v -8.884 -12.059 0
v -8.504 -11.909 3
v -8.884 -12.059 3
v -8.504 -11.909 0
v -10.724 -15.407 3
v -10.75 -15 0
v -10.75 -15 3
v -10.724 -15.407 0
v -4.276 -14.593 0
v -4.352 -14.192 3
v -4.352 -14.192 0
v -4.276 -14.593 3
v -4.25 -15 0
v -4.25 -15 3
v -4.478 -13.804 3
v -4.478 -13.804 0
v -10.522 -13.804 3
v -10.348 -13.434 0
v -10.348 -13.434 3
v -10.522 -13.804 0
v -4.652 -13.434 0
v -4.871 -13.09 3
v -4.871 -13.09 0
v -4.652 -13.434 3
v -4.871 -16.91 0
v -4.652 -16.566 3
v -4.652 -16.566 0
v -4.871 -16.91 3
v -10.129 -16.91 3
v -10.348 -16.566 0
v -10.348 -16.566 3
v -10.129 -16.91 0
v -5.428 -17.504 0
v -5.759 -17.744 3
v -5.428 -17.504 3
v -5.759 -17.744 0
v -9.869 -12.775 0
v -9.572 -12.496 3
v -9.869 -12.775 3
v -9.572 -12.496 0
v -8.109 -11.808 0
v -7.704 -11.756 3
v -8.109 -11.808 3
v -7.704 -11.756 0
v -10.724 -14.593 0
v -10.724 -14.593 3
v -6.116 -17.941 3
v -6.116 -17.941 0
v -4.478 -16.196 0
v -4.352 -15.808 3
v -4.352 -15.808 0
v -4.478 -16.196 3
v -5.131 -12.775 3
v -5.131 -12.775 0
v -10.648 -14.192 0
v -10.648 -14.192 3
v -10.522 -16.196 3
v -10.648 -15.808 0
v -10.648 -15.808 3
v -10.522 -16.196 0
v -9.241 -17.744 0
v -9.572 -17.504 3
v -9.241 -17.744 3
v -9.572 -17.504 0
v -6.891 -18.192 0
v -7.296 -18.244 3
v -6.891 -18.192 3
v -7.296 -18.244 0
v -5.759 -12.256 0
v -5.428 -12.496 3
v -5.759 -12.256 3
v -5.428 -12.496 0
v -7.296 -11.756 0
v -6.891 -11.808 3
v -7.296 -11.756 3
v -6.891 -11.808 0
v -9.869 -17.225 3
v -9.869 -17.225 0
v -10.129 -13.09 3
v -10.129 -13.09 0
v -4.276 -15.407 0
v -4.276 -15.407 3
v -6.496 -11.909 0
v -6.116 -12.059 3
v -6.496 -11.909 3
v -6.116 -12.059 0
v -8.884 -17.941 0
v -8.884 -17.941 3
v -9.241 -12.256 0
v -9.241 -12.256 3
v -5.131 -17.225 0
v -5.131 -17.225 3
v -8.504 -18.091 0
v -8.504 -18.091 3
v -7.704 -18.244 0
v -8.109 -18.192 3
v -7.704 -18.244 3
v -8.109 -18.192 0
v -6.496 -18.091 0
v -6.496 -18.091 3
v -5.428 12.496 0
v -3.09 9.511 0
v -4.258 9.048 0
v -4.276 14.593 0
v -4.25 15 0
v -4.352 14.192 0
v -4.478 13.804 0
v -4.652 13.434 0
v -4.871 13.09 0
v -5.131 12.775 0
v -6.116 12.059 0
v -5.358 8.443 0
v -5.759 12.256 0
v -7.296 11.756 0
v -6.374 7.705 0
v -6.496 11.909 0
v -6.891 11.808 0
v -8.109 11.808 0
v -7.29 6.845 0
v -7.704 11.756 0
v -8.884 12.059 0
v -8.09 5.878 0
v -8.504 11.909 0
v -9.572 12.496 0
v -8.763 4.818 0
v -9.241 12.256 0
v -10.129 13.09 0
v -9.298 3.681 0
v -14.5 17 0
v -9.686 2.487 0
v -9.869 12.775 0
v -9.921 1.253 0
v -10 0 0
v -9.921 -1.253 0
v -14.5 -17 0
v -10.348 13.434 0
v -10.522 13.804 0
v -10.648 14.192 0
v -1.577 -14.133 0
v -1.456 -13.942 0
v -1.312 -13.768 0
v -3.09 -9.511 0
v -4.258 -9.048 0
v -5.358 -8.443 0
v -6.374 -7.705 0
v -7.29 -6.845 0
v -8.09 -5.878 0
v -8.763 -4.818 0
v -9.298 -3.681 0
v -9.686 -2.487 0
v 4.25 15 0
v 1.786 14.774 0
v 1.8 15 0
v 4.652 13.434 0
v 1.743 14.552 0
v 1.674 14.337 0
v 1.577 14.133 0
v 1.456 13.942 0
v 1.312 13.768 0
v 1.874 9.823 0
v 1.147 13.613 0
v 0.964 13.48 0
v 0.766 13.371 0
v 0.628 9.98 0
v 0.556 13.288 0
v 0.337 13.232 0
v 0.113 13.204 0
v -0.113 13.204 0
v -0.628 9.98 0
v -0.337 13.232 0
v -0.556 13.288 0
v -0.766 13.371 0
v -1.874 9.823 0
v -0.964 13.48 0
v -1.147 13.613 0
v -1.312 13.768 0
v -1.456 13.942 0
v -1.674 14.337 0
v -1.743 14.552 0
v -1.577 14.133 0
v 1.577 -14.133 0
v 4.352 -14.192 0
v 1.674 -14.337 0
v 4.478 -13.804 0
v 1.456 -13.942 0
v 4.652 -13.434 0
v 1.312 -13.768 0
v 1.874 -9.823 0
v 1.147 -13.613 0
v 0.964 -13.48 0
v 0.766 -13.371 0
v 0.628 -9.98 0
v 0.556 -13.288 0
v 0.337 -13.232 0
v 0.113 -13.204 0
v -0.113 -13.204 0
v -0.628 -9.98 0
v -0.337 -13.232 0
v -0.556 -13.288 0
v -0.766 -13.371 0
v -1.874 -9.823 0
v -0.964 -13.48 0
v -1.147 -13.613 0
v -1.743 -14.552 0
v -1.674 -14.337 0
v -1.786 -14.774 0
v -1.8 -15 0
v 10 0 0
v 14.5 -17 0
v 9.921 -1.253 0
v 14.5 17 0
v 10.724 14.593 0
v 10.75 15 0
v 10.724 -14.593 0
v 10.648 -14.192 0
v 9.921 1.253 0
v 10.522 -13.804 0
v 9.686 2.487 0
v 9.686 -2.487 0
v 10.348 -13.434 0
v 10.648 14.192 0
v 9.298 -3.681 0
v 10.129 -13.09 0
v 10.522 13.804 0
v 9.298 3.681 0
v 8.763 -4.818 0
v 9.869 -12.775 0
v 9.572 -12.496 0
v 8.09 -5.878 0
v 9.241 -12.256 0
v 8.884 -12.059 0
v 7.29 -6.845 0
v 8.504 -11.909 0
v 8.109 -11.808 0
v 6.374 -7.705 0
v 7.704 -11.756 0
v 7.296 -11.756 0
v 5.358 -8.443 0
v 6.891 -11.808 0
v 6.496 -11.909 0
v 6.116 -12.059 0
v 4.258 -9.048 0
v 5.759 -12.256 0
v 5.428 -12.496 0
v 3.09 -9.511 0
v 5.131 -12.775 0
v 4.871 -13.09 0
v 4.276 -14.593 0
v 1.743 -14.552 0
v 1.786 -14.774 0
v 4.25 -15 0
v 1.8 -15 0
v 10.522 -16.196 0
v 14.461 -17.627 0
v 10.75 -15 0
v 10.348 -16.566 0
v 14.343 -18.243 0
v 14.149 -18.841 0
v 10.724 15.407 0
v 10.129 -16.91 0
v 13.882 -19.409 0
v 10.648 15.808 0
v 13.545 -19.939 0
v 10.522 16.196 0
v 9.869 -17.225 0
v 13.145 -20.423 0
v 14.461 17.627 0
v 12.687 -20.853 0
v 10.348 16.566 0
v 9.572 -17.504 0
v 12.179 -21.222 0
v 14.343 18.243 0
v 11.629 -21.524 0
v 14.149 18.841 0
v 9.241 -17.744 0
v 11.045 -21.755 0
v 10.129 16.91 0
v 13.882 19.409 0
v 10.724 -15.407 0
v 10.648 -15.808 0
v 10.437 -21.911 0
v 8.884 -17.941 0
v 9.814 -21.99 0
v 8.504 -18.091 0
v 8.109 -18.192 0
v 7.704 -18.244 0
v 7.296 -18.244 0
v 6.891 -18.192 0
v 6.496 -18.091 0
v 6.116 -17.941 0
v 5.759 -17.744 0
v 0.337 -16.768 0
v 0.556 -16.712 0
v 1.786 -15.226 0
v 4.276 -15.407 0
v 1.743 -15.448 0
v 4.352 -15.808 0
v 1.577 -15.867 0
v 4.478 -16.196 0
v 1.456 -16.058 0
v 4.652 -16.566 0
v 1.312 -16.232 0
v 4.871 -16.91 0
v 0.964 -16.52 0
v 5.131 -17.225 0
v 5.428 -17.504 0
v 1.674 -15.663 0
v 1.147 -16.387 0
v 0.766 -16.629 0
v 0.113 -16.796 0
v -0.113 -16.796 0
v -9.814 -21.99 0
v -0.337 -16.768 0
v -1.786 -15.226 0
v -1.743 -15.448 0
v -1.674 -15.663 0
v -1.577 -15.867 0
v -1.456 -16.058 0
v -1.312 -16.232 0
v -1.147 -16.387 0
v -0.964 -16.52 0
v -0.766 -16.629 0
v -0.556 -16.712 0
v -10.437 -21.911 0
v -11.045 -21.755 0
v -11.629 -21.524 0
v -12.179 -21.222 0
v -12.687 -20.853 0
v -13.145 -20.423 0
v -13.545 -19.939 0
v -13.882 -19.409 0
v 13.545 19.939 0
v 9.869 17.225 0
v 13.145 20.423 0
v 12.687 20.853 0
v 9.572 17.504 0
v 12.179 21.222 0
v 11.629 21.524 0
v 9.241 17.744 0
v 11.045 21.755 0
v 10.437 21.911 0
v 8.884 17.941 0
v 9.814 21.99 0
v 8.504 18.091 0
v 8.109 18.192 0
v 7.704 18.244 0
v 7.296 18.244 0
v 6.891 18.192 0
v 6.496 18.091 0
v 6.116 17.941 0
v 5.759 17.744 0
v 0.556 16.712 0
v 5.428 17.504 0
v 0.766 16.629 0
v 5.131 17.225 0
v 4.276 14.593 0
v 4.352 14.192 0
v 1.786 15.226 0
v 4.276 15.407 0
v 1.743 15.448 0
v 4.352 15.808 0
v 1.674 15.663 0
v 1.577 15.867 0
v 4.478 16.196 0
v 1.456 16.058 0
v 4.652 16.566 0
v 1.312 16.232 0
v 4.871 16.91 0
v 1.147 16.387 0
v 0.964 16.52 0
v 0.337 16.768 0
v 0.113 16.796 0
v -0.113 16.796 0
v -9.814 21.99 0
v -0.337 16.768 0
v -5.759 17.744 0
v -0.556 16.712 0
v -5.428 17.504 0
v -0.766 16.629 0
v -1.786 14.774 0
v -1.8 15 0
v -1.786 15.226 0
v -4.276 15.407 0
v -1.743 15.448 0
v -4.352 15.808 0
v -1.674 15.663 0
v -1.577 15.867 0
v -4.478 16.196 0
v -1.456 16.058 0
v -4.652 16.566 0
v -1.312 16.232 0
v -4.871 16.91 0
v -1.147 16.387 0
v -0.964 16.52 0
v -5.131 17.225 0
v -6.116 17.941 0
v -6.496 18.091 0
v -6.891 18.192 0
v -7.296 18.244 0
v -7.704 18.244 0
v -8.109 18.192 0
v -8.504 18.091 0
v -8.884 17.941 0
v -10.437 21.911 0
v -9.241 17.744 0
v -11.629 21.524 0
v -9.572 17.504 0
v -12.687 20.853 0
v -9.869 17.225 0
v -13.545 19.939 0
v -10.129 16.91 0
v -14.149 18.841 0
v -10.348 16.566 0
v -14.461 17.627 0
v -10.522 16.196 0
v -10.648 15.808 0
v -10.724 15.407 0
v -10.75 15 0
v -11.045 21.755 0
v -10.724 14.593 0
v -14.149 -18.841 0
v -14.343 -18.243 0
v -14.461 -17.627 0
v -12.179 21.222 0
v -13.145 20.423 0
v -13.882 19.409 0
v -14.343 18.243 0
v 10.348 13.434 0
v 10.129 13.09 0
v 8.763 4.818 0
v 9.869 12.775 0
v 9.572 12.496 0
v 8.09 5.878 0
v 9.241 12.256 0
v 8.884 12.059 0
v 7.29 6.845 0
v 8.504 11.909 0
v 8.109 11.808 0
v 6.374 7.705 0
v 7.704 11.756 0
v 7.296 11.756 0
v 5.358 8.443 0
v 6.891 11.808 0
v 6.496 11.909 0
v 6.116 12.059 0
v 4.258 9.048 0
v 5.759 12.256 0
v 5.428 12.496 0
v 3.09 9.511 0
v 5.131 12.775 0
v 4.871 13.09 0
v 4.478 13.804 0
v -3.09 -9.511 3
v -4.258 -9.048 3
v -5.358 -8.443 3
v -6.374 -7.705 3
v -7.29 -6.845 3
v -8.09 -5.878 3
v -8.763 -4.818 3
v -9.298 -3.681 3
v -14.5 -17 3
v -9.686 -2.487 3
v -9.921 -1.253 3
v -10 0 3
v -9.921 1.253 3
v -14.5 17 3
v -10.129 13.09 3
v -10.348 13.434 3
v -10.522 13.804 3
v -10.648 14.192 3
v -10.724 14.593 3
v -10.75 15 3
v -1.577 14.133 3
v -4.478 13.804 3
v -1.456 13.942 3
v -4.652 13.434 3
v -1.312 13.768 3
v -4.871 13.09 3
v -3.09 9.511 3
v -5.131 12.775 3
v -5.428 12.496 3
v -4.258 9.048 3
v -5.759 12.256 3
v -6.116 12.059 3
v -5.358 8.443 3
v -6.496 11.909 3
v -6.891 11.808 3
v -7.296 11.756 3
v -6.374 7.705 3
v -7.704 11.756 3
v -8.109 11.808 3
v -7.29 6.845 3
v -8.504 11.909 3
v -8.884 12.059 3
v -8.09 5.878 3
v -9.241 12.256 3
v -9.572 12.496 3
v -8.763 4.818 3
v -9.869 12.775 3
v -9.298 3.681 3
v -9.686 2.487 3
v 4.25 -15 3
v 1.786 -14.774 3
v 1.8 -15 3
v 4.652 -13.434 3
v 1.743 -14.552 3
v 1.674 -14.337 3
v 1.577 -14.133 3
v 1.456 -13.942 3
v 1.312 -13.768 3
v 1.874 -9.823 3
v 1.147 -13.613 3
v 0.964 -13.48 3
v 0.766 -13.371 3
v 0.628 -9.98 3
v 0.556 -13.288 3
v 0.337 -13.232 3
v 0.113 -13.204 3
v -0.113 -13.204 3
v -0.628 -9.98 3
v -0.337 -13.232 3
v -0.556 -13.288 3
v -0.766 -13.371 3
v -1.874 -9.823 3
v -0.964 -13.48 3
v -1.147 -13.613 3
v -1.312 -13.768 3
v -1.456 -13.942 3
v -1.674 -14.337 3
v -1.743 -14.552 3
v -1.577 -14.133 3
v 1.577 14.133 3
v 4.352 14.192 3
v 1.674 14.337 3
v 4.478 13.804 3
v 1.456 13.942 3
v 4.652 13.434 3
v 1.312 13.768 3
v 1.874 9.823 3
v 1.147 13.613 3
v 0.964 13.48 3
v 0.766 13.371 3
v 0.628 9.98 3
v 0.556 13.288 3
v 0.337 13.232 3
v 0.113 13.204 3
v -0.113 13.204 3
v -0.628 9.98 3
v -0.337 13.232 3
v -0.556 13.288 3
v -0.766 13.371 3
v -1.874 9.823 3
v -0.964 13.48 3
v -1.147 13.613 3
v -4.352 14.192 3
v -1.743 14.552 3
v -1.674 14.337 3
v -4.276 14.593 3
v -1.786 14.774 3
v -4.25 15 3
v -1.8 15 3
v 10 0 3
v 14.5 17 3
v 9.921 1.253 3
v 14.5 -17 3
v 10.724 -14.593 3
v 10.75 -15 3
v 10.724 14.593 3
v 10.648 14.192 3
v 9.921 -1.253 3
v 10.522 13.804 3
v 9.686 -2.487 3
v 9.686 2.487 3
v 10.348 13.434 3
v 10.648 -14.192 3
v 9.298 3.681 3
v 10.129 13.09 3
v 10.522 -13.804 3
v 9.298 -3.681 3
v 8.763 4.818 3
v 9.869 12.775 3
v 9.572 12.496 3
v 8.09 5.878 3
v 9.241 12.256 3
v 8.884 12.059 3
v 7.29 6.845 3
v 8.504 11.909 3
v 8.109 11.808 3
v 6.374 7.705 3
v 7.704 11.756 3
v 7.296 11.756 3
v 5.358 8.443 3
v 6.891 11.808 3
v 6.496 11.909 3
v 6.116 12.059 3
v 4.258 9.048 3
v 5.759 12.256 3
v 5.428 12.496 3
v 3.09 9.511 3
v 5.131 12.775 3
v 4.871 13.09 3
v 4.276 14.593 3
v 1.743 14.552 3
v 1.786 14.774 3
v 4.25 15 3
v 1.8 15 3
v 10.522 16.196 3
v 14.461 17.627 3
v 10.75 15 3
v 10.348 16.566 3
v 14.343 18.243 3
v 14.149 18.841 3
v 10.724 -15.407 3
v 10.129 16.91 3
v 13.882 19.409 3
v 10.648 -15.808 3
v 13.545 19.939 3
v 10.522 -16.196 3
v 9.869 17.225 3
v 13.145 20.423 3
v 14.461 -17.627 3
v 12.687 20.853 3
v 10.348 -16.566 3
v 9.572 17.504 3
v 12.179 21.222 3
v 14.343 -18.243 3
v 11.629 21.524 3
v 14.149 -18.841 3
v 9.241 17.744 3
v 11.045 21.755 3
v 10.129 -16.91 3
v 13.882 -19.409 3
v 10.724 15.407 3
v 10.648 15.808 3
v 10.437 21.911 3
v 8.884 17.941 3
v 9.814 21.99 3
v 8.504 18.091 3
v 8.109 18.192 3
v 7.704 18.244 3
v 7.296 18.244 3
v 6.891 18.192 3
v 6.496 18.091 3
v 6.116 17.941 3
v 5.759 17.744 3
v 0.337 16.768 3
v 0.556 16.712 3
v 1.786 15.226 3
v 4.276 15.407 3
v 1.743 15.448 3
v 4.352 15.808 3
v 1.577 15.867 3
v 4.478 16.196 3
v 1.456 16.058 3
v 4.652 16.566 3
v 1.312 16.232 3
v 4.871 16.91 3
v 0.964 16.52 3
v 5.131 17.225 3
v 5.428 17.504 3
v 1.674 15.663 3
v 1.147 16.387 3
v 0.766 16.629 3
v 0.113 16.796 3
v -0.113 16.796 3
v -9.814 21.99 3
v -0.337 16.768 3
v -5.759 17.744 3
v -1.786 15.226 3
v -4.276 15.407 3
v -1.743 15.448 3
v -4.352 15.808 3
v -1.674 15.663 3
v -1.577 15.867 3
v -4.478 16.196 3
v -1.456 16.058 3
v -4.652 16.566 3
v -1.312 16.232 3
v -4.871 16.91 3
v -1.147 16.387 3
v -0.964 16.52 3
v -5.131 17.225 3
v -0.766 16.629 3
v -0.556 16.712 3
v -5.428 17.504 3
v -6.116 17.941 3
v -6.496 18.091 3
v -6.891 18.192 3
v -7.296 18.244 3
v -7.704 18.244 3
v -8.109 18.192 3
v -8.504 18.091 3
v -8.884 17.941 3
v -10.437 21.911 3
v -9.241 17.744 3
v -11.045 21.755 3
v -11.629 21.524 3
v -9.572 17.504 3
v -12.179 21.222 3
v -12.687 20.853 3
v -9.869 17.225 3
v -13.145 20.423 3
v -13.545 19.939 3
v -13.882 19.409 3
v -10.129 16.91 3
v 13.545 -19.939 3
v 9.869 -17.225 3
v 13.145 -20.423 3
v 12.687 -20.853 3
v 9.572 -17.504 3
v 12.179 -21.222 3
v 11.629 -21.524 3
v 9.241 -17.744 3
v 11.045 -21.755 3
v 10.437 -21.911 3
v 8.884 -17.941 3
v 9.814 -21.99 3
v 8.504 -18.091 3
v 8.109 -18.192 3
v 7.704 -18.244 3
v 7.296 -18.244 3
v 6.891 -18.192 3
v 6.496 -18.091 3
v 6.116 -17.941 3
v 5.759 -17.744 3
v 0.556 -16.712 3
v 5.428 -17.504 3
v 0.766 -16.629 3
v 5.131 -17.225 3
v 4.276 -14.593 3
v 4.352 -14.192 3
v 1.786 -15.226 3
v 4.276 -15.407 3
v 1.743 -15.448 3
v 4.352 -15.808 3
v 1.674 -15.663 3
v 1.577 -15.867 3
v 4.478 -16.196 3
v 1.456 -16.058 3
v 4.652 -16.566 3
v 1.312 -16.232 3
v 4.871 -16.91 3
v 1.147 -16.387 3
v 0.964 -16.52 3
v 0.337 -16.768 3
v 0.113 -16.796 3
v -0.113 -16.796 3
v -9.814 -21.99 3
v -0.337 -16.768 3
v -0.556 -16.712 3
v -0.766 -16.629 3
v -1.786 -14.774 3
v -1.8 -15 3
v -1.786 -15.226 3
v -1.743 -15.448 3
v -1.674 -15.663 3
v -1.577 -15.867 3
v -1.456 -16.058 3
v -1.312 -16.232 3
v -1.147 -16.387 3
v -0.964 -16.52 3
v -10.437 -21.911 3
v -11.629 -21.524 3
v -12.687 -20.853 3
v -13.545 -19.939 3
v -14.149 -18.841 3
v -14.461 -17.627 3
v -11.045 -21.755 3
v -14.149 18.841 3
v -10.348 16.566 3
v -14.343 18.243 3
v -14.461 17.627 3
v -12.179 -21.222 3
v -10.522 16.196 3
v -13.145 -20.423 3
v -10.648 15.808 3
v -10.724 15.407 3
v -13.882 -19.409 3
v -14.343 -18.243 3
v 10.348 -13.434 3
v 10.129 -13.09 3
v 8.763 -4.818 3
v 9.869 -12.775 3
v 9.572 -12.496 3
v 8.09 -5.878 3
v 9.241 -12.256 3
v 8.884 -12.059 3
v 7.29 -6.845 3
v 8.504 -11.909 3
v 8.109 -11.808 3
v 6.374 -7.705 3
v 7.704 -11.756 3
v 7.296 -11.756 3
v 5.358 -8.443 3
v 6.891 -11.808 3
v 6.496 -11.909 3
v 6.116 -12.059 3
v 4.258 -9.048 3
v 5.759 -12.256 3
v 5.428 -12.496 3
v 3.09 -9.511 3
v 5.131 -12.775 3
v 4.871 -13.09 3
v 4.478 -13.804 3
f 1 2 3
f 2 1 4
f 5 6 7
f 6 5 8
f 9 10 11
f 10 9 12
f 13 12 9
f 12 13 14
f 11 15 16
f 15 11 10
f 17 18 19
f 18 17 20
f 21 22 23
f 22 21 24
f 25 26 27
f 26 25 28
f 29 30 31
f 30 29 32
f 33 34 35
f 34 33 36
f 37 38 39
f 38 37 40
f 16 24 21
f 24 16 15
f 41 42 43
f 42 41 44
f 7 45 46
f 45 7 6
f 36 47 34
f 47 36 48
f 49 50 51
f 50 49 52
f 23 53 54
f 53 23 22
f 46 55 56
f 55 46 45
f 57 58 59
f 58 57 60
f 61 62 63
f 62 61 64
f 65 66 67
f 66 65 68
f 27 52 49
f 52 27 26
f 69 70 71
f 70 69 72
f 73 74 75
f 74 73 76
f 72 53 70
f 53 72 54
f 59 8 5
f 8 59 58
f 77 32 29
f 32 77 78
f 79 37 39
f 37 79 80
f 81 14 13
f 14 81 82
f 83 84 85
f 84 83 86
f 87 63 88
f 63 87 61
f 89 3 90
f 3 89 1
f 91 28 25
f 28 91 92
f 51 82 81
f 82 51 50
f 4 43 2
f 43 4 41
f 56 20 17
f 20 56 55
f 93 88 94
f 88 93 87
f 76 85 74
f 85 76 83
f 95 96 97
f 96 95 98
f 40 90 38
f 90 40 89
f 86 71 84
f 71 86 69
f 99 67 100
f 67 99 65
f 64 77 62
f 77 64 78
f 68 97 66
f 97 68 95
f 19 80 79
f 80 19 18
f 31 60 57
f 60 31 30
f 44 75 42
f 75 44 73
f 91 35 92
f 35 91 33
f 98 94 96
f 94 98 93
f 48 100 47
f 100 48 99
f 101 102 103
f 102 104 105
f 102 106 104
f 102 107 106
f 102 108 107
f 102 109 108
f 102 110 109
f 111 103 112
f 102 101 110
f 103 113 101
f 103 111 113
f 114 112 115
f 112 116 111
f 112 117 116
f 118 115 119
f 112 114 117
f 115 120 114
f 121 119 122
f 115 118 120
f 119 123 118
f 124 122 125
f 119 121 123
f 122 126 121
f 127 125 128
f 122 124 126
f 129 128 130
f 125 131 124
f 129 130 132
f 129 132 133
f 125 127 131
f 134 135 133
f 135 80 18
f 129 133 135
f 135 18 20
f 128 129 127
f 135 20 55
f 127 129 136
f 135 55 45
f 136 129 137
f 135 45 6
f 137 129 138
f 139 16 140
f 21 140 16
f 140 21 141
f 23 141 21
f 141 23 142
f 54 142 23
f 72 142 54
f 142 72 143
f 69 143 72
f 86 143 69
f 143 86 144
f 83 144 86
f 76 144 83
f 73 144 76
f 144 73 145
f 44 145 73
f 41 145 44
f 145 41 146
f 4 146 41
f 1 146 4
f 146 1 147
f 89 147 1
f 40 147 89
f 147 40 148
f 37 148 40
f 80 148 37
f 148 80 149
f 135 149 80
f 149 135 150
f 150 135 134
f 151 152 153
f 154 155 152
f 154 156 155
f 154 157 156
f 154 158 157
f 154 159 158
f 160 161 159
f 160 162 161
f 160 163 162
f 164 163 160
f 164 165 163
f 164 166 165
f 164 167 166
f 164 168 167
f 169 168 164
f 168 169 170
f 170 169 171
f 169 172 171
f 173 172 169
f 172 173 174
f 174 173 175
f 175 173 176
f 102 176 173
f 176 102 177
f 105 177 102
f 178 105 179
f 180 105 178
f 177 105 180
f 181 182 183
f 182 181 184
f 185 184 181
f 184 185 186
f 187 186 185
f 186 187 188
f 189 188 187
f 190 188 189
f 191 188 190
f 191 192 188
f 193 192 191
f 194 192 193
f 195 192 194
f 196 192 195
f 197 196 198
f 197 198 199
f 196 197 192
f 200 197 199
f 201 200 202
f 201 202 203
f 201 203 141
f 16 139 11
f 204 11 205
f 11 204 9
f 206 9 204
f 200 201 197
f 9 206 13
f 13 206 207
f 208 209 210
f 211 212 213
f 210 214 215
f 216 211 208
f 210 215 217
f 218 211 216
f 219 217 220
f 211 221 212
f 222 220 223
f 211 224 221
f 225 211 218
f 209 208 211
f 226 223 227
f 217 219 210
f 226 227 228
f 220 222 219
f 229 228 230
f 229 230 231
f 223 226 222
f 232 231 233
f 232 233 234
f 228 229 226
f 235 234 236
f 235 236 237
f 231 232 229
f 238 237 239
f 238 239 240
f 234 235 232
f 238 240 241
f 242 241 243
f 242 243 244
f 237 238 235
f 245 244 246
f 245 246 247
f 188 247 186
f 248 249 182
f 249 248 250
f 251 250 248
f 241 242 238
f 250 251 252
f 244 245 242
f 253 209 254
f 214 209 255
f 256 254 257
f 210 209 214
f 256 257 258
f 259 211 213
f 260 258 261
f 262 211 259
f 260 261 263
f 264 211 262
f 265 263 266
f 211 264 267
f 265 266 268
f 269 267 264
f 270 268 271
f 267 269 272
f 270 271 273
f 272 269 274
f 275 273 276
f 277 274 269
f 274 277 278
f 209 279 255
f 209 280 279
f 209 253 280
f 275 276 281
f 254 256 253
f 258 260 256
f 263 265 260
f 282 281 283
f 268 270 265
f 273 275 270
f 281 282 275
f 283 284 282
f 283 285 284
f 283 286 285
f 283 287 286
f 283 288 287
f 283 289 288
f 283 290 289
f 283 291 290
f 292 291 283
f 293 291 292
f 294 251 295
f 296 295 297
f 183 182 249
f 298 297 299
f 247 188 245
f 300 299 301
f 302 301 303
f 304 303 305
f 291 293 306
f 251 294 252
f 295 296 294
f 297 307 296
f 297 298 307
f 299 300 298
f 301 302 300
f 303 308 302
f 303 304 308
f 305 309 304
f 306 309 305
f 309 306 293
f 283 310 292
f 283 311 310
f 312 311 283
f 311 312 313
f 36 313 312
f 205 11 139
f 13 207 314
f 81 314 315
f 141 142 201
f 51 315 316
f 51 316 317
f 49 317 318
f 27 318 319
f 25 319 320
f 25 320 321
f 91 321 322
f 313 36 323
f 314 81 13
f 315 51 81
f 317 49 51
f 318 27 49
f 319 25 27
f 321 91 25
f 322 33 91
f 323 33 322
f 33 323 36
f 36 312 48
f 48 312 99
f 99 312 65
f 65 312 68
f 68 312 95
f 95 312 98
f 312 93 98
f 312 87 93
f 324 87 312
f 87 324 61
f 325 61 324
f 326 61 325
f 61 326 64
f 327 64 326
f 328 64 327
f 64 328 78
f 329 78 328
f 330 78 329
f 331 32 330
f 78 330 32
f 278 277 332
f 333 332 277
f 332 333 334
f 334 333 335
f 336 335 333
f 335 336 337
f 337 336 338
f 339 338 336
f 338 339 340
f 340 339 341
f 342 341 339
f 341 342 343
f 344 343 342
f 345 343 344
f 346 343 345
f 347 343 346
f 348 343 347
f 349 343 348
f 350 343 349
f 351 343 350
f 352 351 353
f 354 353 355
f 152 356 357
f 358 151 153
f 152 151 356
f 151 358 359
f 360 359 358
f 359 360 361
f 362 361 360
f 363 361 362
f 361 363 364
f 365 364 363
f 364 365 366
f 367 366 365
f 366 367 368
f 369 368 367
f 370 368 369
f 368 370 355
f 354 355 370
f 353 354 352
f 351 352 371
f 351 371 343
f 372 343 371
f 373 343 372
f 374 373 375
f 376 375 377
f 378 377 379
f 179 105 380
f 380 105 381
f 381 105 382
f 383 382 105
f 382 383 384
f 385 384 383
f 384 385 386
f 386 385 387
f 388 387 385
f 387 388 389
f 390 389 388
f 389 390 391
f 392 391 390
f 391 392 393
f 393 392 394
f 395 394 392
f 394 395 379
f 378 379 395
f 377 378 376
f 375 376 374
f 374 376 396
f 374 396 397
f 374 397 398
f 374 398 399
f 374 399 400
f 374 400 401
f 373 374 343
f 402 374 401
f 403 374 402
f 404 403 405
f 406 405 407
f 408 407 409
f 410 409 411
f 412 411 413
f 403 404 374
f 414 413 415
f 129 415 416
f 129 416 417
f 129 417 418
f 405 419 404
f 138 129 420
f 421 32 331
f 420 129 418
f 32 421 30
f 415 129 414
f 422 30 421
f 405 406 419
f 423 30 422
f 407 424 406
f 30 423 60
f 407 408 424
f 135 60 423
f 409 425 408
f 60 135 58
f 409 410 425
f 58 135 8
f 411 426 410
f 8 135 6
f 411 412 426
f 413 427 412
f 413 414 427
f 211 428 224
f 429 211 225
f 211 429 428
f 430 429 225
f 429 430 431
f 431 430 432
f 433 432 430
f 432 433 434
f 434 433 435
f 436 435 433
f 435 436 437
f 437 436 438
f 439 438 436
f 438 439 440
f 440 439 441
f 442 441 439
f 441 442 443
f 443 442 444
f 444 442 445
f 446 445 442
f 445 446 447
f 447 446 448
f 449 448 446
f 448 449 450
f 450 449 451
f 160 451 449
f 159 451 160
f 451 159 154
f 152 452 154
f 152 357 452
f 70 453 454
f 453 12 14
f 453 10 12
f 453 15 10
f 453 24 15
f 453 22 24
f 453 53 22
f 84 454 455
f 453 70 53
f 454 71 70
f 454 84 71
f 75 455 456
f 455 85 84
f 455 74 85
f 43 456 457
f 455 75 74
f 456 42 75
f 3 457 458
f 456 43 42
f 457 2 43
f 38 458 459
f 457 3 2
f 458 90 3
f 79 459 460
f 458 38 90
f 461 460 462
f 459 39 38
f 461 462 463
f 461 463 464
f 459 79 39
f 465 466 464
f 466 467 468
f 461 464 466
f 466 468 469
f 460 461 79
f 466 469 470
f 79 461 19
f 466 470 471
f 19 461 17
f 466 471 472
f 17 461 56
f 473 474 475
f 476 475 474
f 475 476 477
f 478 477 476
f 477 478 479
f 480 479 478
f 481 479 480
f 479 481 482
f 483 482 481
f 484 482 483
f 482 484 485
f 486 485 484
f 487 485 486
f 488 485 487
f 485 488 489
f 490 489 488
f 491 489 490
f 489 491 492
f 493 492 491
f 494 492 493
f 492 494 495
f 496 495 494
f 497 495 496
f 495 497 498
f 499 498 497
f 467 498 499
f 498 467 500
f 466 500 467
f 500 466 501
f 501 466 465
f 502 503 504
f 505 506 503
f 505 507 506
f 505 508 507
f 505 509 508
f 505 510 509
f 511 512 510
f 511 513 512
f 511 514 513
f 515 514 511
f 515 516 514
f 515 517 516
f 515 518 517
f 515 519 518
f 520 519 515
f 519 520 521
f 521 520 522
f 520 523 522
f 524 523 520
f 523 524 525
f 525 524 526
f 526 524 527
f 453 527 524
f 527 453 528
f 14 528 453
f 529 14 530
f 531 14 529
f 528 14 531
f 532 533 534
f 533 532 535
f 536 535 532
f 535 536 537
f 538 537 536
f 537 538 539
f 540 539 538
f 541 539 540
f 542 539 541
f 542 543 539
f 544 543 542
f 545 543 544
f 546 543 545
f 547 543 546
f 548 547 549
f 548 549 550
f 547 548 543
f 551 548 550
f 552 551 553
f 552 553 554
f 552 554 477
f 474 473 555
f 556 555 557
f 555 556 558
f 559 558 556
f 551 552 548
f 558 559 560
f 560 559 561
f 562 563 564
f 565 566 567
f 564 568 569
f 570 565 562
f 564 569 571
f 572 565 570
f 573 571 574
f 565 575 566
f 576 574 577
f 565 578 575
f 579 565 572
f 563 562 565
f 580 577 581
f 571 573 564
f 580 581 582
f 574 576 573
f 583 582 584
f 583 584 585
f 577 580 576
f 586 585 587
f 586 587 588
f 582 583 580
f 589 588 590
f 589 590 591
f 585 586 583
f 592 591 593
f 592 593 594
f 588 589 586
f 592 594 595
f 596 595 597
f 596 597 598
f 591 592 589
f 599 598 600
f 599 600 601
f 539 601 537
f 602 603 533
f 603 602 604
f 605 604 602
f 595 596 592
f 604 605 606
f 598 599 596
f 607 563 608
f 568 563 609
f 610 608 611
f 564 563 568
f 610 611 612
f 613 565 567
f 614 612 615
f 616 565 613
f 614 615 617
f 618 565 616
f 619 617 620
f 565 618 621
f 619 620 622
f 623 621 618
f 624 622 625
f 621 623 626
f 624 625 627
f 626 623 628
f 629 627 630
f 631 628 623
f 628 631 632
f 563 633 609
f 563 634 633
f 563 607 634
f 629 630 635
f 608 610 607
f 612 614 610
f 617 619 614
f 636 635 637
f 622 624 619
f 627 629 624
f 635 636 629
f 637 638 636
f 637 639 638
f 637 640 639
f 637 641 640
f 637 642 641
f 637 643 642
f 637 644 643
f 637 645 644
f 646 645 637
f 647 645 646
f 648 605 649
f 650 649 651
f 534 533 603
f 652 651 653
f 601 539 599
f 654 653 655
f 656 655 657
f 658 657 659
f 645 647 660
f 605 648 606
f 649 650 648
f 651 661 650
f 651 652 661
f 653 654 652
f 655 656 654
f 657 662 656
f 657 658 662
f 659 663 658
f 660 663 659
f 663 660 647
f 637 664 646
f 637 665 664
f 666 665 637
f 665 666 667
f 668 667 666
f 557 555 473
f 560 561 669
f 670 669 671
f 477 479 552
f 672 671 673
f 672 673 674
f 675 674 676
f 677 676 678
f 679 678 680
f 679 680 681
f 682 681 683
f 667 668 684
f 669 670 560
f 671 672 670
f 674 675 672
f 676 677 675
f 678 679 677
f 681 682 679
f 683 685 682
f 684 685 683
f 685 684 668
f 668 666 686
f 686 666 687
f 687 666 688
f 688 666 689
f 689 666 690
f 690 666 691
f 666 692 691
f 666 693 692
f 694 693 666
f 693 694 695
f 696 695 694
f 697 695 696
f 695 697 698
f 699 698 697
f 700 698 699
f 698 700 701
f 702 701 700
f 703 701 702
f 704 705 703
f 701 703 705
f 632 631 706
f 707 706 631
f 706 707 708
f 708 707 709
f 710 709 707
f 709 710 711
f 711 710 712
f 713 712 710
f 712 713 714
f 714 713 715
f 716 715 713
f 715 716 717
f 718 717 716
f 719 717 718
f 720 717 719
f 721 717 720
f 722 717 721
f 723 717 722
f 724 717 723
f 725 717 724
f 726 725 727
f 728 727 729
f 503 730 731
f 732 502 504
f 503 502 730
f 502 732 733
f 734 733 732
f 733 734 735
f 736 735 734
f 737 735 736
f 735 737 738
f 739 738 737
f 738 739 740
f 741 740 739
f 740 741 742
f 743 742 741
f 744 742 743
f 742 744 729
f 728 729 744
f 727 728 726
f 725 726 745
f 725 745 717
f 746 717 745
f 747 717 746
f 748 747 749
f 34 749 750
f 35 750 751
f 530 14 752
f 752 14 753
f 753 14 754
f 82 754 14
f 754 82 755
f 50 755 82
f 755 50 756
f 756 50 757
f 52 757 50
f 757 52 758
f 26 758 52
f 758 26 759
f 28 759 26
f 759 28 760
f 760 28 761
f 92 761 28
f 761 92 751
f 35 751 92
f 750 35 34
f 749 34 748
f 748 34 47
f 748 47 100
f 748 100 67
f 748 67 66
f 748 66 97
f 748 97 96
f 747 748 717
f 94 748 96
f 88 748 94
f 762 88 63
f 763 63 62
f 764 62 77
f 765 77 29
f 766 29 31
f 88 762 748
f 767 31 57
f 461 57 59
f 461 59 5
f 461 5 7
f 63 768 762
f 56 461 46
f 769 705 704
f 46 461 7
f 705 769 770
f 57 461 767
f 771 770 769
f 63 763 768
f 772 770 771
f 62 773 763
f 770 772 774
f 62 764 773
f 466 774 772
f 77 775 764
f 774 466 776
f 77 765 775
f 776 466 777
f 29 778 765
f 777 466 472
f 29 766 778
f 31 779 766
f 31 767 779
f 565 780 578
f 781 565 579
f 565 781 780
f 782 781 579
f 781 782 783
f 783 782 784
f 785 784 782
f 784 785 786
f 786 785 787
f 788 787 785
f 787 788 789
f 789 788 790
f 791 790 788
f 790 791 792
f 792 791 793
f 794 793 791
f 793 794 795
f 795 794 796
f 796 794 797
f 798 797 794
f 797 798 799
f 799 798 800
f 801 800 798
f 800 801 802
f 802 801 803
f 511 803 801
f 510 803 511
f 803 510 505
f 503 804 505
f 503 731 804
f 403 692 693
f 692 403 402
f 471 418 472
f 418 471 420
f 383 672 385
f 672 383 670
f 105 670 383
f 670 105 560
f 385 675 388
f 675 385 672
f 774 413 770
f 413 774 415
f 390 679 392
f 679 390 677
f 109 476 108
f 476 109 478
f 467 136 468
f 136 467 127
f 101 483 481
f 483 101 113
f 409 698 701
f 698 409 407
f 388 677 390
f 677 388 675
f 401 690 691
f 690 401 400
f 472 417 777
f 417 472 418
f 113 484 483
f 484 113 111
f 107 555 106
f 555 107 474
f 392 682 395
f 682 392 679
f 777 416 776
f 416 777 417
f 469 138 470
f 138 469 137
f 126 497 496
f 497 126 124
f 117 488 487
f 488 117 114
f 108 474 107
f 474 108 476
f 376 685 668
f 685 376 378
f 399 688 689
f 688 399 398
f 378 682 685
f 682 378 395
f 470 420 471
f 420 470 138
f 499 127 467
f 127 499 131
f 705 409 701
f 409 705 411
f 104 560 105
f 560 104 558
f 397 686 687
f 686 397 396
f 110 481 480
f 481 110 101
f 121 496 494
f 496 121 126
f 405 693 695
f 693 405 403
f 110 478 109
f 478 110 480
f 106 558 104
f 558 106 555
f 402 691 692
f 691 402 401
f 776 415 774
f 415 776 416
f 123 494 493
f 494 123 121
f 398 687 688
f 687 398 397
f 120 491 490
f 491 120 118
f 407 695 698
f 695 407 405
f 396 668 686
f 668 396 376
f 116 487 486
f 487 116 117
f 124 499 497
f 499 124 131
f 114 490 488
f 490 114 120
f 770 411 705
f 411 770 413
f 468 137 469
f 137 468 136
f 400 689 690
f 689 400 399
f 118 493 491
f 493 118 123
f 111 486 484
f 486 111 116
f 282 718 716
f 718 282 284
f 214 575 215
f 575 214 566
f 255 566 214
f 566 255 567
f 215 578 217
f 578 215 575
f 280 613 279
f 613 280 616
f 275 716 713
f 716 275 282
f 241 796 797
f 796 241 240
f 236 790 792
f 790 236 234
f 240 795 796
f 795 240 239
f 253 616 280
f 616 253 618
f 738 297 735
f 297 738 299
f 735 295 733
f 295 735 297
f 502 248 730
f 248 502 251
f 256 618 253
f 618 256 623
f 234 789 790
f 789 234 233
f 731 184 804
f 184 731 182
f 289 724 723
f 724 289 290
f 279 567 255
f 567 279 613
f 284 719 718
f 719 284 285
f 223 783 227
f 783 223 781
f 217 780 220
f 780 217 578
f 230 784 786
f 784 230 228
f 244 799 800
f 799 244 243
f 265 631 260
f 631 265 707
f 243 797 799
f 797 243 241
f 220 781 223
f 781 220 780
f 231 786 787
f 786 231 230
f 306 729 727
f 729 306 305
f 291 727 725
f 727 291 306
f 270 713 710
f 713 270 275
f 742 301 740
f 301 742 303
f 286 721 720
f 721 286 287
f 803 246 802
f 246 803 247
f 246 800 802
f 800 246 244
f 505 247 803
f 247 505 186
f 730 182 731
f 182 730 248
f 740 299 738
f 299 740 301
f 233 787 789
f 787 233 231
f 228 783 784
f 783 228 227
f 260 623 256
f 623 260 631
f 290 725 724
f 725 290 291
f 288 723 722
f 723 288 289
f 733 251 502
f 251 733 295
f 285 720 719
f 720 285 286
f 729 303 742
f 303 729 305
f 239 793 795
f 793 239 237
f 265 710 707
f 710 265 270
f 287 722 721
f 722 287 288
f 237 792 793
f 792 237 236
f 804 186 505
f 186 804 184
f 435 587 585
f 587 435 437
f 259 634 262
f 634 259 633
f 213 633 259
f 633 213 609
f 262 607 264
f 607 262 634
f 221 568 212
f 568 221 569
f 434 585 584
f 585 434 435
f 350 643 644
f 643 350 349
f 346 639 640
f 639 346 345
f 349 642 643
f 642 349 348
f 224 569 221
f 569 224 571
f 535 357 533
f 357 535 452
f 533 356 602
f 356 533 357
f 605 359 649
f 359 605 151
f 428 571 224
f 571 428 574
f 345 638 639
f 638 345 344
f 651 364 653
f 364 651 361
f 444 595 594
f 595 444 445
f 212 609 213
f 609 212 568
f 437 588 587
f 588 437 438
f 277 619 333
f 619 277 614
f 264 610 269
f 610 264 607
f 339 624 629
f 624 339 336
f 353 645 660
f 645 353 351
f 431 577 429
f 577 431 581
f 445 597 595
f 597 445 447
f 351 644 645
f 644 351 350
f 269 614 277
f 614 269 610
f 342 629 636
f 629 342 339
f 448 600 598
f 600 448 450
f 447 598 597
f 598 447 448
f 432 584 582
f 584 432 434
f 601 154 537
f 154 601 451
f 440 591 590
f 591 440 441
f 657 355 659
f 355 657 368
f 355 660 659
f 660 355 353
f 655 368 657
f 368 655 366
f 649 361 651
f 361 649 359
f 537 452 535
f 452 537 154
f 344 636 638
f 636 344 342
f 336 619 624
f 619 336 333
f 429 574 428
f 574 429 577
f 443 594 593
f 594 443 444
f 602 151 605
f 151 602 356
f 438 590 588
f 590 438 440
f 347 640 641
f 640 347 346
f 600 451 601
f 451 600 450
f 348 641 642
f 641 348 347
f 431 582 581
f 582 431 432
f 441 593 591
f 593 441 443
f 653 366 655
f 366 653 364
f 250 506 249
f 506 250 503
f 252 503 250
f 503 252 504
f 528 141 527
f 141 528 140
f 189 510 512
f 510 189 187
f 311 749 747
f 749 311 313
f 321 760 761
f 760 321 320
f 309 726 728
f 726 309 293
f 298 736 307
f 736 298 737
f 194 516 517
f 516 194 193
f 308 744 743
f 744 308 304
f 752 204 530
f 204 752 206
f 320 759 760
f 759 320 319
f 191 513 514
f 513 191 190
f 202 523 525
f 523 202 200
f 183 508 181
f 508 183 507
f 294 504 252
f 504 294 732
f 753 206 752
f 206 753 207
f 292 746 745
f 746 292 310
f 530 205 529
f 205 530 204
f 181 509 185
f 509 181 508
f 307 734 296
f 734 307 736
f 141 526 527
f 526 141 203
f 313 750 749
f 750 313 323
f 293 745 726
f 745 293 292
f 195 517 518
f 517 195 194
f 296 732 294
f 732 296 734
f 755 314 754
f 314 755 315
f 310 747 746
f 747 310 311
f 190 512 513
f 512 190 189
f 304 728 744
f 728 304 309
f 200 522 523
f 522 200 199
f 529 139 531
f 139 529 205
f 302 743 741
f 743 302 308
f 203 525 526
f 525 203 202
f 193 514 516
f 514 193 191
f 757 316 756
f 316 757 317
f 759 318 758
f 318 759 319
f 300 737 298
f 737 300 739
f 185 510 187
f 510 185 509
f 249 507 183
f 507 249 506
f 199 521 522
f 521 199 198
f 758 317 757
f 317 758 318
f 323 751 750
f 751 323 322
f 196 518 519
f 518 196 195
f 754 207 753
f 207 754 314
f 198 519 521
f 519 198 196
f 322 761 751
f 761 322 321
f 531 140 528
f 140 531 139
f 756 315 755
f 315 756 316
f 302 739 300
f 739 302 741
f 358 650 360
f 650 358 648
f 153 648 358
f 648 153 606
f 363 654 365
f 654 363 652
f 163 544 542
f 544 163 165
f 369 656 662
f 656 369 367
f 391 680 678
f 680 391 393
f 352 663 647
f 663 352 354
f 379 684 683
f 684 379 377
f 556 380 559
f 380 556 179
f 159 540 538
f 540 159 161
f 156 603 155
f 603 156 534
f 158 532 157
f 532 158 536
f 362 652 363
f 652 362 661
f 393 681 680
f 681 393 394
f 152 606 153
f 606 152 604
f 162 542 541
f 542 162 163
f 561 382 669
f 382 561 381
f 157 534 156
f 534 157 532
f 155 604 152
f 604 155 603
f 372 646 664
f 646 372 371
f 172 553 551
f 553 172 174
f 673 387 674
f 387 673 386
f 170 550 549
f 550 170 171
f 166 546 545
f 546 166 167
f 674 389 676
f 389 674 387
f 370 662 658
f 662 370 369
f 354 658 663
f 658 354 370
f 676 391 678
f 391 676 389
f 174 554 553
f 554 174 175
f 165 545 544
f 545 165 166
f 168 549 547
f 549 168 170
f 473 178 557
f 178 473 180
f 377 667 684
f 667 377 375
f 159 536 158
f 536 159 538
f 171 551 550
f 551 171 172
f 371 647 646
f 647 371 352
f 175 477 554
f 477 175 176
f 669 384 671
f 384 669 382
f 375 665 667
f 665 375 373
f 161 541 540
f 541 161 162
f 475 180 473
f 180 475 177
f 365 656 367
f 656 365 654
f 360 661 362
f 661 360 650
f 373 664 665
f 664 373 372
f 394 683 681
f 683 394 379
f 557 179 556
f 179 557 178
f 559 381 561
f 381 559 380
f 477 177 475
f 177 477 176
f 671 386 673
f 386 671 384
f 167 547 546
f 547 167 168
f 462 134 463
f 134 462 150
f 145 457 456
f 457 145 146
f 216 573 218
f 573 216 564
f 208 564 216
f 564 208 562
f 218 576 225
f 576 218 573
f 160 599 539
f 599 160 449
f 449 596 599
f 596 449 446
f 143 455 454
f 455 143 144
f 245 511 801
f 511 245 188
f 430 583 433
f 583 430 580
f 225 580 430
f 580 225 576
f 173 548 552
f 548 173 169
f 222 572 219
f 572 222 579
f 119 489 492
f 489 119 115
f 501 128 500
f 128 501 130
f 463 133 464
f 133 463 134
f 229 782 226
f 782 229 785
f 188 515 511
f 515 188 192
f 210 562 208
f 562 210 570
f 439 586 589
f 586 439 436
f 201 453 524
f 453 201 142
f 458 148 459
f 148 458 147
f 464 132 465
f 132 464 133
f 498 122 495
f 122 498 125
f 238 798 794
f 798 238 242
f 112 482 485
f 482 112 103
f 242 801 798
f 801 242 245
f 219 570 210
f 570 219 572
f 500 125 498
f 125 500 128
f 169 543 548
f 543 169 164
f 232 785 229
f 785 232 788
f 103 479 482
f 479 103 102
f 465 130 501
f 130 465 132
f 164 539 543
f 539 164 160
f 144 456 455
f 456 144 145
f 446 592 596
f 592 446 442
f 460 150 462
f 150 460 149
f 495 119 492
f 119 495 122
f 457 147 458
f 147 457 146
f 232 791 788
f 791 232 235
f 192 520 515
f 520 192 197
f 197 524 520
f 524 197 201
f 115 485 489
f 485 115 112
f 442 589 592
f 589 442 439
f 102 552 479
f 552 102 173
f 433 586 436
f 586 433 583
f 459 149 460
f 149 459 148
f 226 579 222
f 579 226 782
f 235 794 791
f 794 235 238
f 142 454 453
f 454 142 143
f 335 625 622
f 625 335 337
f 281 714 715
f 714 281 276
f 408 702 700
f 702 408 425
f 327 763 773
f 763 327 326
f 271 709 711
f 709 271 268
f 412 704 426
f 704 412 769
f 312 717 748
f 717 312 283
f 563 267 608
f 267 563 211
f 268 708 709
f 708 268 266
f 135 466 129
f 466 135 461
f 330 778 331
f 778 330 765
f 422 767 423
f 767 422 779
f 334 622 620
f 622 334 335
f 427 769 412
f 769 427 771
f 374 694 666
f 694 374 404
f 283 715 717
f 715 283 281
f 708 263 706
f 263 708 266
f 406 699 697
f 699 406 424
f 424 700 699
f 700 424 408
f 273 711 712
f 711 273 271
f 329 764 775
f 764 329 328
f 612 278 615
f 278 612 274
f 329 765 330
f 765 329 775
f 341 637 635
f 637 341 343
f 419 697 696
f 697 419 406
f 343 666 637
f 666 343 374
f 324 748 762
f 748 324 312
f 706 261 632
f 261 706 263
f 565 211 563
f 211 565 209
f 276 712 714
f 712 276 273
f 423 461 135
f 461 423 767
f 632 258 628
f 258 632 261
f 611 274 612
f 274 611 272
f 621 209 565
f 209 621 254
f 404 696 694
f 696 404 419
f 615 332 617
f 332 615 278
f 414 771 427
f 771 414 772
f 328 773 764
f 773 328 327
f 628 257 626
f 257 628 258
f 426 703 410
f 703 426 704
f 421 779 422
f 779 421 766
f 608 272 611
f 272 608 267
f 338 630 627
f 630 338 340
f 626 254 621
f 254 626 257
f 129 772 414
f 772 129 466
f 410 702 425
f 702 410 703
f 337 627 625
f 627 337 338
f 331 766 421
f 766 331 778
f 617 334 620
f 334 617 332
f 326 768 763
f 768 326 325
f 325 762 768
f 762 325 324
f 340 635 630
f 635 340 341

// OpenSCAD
$fn = 50;

difference() {
	union() {
		hull() {
			translate(v = [-9.5, 17.0, 0]) {
				cylinder(h = 3, r = 5);
			}
			translate(v = [9.5, 17.0, 0]) {
				cylinder(h = 3, r = 5);
			}
			translate(v = [-9.5, -17.0, 0]) {
				cylinder(h = 3, r = 5);
			}
			translate(v = [9.5, -17.0, 0]) {
				cylinder(h = 3, r = 5);
			}
		}
	}
	union() {
		translate(v = [-7.5, -15.0, 0]) {
			cylinder(h = 3, r = 3.25);
		}
		translate(v = [-7.5, 15.0, 0]) {
			cylinder(h = 3, r = 3.25);
		}
		translate(v = [7.5, -15.0, 0]) {
			cylinder(h = 3, r = 3.25);
		}
		translate(v = [7.5, 15.0, 0]) {
			cylinder(h = 3, r = 3.25);
		}
		translate(v = [0.0, -15.0, 0]) {
			cylinder(h = 3, r = 1.8);
		}
		translate(v = [0.0, 15.0, 0]) {
			cylinder(h = 3, r = 1.8);
		}
		cylinder(h = 3, r = 10.0);
	}
}
